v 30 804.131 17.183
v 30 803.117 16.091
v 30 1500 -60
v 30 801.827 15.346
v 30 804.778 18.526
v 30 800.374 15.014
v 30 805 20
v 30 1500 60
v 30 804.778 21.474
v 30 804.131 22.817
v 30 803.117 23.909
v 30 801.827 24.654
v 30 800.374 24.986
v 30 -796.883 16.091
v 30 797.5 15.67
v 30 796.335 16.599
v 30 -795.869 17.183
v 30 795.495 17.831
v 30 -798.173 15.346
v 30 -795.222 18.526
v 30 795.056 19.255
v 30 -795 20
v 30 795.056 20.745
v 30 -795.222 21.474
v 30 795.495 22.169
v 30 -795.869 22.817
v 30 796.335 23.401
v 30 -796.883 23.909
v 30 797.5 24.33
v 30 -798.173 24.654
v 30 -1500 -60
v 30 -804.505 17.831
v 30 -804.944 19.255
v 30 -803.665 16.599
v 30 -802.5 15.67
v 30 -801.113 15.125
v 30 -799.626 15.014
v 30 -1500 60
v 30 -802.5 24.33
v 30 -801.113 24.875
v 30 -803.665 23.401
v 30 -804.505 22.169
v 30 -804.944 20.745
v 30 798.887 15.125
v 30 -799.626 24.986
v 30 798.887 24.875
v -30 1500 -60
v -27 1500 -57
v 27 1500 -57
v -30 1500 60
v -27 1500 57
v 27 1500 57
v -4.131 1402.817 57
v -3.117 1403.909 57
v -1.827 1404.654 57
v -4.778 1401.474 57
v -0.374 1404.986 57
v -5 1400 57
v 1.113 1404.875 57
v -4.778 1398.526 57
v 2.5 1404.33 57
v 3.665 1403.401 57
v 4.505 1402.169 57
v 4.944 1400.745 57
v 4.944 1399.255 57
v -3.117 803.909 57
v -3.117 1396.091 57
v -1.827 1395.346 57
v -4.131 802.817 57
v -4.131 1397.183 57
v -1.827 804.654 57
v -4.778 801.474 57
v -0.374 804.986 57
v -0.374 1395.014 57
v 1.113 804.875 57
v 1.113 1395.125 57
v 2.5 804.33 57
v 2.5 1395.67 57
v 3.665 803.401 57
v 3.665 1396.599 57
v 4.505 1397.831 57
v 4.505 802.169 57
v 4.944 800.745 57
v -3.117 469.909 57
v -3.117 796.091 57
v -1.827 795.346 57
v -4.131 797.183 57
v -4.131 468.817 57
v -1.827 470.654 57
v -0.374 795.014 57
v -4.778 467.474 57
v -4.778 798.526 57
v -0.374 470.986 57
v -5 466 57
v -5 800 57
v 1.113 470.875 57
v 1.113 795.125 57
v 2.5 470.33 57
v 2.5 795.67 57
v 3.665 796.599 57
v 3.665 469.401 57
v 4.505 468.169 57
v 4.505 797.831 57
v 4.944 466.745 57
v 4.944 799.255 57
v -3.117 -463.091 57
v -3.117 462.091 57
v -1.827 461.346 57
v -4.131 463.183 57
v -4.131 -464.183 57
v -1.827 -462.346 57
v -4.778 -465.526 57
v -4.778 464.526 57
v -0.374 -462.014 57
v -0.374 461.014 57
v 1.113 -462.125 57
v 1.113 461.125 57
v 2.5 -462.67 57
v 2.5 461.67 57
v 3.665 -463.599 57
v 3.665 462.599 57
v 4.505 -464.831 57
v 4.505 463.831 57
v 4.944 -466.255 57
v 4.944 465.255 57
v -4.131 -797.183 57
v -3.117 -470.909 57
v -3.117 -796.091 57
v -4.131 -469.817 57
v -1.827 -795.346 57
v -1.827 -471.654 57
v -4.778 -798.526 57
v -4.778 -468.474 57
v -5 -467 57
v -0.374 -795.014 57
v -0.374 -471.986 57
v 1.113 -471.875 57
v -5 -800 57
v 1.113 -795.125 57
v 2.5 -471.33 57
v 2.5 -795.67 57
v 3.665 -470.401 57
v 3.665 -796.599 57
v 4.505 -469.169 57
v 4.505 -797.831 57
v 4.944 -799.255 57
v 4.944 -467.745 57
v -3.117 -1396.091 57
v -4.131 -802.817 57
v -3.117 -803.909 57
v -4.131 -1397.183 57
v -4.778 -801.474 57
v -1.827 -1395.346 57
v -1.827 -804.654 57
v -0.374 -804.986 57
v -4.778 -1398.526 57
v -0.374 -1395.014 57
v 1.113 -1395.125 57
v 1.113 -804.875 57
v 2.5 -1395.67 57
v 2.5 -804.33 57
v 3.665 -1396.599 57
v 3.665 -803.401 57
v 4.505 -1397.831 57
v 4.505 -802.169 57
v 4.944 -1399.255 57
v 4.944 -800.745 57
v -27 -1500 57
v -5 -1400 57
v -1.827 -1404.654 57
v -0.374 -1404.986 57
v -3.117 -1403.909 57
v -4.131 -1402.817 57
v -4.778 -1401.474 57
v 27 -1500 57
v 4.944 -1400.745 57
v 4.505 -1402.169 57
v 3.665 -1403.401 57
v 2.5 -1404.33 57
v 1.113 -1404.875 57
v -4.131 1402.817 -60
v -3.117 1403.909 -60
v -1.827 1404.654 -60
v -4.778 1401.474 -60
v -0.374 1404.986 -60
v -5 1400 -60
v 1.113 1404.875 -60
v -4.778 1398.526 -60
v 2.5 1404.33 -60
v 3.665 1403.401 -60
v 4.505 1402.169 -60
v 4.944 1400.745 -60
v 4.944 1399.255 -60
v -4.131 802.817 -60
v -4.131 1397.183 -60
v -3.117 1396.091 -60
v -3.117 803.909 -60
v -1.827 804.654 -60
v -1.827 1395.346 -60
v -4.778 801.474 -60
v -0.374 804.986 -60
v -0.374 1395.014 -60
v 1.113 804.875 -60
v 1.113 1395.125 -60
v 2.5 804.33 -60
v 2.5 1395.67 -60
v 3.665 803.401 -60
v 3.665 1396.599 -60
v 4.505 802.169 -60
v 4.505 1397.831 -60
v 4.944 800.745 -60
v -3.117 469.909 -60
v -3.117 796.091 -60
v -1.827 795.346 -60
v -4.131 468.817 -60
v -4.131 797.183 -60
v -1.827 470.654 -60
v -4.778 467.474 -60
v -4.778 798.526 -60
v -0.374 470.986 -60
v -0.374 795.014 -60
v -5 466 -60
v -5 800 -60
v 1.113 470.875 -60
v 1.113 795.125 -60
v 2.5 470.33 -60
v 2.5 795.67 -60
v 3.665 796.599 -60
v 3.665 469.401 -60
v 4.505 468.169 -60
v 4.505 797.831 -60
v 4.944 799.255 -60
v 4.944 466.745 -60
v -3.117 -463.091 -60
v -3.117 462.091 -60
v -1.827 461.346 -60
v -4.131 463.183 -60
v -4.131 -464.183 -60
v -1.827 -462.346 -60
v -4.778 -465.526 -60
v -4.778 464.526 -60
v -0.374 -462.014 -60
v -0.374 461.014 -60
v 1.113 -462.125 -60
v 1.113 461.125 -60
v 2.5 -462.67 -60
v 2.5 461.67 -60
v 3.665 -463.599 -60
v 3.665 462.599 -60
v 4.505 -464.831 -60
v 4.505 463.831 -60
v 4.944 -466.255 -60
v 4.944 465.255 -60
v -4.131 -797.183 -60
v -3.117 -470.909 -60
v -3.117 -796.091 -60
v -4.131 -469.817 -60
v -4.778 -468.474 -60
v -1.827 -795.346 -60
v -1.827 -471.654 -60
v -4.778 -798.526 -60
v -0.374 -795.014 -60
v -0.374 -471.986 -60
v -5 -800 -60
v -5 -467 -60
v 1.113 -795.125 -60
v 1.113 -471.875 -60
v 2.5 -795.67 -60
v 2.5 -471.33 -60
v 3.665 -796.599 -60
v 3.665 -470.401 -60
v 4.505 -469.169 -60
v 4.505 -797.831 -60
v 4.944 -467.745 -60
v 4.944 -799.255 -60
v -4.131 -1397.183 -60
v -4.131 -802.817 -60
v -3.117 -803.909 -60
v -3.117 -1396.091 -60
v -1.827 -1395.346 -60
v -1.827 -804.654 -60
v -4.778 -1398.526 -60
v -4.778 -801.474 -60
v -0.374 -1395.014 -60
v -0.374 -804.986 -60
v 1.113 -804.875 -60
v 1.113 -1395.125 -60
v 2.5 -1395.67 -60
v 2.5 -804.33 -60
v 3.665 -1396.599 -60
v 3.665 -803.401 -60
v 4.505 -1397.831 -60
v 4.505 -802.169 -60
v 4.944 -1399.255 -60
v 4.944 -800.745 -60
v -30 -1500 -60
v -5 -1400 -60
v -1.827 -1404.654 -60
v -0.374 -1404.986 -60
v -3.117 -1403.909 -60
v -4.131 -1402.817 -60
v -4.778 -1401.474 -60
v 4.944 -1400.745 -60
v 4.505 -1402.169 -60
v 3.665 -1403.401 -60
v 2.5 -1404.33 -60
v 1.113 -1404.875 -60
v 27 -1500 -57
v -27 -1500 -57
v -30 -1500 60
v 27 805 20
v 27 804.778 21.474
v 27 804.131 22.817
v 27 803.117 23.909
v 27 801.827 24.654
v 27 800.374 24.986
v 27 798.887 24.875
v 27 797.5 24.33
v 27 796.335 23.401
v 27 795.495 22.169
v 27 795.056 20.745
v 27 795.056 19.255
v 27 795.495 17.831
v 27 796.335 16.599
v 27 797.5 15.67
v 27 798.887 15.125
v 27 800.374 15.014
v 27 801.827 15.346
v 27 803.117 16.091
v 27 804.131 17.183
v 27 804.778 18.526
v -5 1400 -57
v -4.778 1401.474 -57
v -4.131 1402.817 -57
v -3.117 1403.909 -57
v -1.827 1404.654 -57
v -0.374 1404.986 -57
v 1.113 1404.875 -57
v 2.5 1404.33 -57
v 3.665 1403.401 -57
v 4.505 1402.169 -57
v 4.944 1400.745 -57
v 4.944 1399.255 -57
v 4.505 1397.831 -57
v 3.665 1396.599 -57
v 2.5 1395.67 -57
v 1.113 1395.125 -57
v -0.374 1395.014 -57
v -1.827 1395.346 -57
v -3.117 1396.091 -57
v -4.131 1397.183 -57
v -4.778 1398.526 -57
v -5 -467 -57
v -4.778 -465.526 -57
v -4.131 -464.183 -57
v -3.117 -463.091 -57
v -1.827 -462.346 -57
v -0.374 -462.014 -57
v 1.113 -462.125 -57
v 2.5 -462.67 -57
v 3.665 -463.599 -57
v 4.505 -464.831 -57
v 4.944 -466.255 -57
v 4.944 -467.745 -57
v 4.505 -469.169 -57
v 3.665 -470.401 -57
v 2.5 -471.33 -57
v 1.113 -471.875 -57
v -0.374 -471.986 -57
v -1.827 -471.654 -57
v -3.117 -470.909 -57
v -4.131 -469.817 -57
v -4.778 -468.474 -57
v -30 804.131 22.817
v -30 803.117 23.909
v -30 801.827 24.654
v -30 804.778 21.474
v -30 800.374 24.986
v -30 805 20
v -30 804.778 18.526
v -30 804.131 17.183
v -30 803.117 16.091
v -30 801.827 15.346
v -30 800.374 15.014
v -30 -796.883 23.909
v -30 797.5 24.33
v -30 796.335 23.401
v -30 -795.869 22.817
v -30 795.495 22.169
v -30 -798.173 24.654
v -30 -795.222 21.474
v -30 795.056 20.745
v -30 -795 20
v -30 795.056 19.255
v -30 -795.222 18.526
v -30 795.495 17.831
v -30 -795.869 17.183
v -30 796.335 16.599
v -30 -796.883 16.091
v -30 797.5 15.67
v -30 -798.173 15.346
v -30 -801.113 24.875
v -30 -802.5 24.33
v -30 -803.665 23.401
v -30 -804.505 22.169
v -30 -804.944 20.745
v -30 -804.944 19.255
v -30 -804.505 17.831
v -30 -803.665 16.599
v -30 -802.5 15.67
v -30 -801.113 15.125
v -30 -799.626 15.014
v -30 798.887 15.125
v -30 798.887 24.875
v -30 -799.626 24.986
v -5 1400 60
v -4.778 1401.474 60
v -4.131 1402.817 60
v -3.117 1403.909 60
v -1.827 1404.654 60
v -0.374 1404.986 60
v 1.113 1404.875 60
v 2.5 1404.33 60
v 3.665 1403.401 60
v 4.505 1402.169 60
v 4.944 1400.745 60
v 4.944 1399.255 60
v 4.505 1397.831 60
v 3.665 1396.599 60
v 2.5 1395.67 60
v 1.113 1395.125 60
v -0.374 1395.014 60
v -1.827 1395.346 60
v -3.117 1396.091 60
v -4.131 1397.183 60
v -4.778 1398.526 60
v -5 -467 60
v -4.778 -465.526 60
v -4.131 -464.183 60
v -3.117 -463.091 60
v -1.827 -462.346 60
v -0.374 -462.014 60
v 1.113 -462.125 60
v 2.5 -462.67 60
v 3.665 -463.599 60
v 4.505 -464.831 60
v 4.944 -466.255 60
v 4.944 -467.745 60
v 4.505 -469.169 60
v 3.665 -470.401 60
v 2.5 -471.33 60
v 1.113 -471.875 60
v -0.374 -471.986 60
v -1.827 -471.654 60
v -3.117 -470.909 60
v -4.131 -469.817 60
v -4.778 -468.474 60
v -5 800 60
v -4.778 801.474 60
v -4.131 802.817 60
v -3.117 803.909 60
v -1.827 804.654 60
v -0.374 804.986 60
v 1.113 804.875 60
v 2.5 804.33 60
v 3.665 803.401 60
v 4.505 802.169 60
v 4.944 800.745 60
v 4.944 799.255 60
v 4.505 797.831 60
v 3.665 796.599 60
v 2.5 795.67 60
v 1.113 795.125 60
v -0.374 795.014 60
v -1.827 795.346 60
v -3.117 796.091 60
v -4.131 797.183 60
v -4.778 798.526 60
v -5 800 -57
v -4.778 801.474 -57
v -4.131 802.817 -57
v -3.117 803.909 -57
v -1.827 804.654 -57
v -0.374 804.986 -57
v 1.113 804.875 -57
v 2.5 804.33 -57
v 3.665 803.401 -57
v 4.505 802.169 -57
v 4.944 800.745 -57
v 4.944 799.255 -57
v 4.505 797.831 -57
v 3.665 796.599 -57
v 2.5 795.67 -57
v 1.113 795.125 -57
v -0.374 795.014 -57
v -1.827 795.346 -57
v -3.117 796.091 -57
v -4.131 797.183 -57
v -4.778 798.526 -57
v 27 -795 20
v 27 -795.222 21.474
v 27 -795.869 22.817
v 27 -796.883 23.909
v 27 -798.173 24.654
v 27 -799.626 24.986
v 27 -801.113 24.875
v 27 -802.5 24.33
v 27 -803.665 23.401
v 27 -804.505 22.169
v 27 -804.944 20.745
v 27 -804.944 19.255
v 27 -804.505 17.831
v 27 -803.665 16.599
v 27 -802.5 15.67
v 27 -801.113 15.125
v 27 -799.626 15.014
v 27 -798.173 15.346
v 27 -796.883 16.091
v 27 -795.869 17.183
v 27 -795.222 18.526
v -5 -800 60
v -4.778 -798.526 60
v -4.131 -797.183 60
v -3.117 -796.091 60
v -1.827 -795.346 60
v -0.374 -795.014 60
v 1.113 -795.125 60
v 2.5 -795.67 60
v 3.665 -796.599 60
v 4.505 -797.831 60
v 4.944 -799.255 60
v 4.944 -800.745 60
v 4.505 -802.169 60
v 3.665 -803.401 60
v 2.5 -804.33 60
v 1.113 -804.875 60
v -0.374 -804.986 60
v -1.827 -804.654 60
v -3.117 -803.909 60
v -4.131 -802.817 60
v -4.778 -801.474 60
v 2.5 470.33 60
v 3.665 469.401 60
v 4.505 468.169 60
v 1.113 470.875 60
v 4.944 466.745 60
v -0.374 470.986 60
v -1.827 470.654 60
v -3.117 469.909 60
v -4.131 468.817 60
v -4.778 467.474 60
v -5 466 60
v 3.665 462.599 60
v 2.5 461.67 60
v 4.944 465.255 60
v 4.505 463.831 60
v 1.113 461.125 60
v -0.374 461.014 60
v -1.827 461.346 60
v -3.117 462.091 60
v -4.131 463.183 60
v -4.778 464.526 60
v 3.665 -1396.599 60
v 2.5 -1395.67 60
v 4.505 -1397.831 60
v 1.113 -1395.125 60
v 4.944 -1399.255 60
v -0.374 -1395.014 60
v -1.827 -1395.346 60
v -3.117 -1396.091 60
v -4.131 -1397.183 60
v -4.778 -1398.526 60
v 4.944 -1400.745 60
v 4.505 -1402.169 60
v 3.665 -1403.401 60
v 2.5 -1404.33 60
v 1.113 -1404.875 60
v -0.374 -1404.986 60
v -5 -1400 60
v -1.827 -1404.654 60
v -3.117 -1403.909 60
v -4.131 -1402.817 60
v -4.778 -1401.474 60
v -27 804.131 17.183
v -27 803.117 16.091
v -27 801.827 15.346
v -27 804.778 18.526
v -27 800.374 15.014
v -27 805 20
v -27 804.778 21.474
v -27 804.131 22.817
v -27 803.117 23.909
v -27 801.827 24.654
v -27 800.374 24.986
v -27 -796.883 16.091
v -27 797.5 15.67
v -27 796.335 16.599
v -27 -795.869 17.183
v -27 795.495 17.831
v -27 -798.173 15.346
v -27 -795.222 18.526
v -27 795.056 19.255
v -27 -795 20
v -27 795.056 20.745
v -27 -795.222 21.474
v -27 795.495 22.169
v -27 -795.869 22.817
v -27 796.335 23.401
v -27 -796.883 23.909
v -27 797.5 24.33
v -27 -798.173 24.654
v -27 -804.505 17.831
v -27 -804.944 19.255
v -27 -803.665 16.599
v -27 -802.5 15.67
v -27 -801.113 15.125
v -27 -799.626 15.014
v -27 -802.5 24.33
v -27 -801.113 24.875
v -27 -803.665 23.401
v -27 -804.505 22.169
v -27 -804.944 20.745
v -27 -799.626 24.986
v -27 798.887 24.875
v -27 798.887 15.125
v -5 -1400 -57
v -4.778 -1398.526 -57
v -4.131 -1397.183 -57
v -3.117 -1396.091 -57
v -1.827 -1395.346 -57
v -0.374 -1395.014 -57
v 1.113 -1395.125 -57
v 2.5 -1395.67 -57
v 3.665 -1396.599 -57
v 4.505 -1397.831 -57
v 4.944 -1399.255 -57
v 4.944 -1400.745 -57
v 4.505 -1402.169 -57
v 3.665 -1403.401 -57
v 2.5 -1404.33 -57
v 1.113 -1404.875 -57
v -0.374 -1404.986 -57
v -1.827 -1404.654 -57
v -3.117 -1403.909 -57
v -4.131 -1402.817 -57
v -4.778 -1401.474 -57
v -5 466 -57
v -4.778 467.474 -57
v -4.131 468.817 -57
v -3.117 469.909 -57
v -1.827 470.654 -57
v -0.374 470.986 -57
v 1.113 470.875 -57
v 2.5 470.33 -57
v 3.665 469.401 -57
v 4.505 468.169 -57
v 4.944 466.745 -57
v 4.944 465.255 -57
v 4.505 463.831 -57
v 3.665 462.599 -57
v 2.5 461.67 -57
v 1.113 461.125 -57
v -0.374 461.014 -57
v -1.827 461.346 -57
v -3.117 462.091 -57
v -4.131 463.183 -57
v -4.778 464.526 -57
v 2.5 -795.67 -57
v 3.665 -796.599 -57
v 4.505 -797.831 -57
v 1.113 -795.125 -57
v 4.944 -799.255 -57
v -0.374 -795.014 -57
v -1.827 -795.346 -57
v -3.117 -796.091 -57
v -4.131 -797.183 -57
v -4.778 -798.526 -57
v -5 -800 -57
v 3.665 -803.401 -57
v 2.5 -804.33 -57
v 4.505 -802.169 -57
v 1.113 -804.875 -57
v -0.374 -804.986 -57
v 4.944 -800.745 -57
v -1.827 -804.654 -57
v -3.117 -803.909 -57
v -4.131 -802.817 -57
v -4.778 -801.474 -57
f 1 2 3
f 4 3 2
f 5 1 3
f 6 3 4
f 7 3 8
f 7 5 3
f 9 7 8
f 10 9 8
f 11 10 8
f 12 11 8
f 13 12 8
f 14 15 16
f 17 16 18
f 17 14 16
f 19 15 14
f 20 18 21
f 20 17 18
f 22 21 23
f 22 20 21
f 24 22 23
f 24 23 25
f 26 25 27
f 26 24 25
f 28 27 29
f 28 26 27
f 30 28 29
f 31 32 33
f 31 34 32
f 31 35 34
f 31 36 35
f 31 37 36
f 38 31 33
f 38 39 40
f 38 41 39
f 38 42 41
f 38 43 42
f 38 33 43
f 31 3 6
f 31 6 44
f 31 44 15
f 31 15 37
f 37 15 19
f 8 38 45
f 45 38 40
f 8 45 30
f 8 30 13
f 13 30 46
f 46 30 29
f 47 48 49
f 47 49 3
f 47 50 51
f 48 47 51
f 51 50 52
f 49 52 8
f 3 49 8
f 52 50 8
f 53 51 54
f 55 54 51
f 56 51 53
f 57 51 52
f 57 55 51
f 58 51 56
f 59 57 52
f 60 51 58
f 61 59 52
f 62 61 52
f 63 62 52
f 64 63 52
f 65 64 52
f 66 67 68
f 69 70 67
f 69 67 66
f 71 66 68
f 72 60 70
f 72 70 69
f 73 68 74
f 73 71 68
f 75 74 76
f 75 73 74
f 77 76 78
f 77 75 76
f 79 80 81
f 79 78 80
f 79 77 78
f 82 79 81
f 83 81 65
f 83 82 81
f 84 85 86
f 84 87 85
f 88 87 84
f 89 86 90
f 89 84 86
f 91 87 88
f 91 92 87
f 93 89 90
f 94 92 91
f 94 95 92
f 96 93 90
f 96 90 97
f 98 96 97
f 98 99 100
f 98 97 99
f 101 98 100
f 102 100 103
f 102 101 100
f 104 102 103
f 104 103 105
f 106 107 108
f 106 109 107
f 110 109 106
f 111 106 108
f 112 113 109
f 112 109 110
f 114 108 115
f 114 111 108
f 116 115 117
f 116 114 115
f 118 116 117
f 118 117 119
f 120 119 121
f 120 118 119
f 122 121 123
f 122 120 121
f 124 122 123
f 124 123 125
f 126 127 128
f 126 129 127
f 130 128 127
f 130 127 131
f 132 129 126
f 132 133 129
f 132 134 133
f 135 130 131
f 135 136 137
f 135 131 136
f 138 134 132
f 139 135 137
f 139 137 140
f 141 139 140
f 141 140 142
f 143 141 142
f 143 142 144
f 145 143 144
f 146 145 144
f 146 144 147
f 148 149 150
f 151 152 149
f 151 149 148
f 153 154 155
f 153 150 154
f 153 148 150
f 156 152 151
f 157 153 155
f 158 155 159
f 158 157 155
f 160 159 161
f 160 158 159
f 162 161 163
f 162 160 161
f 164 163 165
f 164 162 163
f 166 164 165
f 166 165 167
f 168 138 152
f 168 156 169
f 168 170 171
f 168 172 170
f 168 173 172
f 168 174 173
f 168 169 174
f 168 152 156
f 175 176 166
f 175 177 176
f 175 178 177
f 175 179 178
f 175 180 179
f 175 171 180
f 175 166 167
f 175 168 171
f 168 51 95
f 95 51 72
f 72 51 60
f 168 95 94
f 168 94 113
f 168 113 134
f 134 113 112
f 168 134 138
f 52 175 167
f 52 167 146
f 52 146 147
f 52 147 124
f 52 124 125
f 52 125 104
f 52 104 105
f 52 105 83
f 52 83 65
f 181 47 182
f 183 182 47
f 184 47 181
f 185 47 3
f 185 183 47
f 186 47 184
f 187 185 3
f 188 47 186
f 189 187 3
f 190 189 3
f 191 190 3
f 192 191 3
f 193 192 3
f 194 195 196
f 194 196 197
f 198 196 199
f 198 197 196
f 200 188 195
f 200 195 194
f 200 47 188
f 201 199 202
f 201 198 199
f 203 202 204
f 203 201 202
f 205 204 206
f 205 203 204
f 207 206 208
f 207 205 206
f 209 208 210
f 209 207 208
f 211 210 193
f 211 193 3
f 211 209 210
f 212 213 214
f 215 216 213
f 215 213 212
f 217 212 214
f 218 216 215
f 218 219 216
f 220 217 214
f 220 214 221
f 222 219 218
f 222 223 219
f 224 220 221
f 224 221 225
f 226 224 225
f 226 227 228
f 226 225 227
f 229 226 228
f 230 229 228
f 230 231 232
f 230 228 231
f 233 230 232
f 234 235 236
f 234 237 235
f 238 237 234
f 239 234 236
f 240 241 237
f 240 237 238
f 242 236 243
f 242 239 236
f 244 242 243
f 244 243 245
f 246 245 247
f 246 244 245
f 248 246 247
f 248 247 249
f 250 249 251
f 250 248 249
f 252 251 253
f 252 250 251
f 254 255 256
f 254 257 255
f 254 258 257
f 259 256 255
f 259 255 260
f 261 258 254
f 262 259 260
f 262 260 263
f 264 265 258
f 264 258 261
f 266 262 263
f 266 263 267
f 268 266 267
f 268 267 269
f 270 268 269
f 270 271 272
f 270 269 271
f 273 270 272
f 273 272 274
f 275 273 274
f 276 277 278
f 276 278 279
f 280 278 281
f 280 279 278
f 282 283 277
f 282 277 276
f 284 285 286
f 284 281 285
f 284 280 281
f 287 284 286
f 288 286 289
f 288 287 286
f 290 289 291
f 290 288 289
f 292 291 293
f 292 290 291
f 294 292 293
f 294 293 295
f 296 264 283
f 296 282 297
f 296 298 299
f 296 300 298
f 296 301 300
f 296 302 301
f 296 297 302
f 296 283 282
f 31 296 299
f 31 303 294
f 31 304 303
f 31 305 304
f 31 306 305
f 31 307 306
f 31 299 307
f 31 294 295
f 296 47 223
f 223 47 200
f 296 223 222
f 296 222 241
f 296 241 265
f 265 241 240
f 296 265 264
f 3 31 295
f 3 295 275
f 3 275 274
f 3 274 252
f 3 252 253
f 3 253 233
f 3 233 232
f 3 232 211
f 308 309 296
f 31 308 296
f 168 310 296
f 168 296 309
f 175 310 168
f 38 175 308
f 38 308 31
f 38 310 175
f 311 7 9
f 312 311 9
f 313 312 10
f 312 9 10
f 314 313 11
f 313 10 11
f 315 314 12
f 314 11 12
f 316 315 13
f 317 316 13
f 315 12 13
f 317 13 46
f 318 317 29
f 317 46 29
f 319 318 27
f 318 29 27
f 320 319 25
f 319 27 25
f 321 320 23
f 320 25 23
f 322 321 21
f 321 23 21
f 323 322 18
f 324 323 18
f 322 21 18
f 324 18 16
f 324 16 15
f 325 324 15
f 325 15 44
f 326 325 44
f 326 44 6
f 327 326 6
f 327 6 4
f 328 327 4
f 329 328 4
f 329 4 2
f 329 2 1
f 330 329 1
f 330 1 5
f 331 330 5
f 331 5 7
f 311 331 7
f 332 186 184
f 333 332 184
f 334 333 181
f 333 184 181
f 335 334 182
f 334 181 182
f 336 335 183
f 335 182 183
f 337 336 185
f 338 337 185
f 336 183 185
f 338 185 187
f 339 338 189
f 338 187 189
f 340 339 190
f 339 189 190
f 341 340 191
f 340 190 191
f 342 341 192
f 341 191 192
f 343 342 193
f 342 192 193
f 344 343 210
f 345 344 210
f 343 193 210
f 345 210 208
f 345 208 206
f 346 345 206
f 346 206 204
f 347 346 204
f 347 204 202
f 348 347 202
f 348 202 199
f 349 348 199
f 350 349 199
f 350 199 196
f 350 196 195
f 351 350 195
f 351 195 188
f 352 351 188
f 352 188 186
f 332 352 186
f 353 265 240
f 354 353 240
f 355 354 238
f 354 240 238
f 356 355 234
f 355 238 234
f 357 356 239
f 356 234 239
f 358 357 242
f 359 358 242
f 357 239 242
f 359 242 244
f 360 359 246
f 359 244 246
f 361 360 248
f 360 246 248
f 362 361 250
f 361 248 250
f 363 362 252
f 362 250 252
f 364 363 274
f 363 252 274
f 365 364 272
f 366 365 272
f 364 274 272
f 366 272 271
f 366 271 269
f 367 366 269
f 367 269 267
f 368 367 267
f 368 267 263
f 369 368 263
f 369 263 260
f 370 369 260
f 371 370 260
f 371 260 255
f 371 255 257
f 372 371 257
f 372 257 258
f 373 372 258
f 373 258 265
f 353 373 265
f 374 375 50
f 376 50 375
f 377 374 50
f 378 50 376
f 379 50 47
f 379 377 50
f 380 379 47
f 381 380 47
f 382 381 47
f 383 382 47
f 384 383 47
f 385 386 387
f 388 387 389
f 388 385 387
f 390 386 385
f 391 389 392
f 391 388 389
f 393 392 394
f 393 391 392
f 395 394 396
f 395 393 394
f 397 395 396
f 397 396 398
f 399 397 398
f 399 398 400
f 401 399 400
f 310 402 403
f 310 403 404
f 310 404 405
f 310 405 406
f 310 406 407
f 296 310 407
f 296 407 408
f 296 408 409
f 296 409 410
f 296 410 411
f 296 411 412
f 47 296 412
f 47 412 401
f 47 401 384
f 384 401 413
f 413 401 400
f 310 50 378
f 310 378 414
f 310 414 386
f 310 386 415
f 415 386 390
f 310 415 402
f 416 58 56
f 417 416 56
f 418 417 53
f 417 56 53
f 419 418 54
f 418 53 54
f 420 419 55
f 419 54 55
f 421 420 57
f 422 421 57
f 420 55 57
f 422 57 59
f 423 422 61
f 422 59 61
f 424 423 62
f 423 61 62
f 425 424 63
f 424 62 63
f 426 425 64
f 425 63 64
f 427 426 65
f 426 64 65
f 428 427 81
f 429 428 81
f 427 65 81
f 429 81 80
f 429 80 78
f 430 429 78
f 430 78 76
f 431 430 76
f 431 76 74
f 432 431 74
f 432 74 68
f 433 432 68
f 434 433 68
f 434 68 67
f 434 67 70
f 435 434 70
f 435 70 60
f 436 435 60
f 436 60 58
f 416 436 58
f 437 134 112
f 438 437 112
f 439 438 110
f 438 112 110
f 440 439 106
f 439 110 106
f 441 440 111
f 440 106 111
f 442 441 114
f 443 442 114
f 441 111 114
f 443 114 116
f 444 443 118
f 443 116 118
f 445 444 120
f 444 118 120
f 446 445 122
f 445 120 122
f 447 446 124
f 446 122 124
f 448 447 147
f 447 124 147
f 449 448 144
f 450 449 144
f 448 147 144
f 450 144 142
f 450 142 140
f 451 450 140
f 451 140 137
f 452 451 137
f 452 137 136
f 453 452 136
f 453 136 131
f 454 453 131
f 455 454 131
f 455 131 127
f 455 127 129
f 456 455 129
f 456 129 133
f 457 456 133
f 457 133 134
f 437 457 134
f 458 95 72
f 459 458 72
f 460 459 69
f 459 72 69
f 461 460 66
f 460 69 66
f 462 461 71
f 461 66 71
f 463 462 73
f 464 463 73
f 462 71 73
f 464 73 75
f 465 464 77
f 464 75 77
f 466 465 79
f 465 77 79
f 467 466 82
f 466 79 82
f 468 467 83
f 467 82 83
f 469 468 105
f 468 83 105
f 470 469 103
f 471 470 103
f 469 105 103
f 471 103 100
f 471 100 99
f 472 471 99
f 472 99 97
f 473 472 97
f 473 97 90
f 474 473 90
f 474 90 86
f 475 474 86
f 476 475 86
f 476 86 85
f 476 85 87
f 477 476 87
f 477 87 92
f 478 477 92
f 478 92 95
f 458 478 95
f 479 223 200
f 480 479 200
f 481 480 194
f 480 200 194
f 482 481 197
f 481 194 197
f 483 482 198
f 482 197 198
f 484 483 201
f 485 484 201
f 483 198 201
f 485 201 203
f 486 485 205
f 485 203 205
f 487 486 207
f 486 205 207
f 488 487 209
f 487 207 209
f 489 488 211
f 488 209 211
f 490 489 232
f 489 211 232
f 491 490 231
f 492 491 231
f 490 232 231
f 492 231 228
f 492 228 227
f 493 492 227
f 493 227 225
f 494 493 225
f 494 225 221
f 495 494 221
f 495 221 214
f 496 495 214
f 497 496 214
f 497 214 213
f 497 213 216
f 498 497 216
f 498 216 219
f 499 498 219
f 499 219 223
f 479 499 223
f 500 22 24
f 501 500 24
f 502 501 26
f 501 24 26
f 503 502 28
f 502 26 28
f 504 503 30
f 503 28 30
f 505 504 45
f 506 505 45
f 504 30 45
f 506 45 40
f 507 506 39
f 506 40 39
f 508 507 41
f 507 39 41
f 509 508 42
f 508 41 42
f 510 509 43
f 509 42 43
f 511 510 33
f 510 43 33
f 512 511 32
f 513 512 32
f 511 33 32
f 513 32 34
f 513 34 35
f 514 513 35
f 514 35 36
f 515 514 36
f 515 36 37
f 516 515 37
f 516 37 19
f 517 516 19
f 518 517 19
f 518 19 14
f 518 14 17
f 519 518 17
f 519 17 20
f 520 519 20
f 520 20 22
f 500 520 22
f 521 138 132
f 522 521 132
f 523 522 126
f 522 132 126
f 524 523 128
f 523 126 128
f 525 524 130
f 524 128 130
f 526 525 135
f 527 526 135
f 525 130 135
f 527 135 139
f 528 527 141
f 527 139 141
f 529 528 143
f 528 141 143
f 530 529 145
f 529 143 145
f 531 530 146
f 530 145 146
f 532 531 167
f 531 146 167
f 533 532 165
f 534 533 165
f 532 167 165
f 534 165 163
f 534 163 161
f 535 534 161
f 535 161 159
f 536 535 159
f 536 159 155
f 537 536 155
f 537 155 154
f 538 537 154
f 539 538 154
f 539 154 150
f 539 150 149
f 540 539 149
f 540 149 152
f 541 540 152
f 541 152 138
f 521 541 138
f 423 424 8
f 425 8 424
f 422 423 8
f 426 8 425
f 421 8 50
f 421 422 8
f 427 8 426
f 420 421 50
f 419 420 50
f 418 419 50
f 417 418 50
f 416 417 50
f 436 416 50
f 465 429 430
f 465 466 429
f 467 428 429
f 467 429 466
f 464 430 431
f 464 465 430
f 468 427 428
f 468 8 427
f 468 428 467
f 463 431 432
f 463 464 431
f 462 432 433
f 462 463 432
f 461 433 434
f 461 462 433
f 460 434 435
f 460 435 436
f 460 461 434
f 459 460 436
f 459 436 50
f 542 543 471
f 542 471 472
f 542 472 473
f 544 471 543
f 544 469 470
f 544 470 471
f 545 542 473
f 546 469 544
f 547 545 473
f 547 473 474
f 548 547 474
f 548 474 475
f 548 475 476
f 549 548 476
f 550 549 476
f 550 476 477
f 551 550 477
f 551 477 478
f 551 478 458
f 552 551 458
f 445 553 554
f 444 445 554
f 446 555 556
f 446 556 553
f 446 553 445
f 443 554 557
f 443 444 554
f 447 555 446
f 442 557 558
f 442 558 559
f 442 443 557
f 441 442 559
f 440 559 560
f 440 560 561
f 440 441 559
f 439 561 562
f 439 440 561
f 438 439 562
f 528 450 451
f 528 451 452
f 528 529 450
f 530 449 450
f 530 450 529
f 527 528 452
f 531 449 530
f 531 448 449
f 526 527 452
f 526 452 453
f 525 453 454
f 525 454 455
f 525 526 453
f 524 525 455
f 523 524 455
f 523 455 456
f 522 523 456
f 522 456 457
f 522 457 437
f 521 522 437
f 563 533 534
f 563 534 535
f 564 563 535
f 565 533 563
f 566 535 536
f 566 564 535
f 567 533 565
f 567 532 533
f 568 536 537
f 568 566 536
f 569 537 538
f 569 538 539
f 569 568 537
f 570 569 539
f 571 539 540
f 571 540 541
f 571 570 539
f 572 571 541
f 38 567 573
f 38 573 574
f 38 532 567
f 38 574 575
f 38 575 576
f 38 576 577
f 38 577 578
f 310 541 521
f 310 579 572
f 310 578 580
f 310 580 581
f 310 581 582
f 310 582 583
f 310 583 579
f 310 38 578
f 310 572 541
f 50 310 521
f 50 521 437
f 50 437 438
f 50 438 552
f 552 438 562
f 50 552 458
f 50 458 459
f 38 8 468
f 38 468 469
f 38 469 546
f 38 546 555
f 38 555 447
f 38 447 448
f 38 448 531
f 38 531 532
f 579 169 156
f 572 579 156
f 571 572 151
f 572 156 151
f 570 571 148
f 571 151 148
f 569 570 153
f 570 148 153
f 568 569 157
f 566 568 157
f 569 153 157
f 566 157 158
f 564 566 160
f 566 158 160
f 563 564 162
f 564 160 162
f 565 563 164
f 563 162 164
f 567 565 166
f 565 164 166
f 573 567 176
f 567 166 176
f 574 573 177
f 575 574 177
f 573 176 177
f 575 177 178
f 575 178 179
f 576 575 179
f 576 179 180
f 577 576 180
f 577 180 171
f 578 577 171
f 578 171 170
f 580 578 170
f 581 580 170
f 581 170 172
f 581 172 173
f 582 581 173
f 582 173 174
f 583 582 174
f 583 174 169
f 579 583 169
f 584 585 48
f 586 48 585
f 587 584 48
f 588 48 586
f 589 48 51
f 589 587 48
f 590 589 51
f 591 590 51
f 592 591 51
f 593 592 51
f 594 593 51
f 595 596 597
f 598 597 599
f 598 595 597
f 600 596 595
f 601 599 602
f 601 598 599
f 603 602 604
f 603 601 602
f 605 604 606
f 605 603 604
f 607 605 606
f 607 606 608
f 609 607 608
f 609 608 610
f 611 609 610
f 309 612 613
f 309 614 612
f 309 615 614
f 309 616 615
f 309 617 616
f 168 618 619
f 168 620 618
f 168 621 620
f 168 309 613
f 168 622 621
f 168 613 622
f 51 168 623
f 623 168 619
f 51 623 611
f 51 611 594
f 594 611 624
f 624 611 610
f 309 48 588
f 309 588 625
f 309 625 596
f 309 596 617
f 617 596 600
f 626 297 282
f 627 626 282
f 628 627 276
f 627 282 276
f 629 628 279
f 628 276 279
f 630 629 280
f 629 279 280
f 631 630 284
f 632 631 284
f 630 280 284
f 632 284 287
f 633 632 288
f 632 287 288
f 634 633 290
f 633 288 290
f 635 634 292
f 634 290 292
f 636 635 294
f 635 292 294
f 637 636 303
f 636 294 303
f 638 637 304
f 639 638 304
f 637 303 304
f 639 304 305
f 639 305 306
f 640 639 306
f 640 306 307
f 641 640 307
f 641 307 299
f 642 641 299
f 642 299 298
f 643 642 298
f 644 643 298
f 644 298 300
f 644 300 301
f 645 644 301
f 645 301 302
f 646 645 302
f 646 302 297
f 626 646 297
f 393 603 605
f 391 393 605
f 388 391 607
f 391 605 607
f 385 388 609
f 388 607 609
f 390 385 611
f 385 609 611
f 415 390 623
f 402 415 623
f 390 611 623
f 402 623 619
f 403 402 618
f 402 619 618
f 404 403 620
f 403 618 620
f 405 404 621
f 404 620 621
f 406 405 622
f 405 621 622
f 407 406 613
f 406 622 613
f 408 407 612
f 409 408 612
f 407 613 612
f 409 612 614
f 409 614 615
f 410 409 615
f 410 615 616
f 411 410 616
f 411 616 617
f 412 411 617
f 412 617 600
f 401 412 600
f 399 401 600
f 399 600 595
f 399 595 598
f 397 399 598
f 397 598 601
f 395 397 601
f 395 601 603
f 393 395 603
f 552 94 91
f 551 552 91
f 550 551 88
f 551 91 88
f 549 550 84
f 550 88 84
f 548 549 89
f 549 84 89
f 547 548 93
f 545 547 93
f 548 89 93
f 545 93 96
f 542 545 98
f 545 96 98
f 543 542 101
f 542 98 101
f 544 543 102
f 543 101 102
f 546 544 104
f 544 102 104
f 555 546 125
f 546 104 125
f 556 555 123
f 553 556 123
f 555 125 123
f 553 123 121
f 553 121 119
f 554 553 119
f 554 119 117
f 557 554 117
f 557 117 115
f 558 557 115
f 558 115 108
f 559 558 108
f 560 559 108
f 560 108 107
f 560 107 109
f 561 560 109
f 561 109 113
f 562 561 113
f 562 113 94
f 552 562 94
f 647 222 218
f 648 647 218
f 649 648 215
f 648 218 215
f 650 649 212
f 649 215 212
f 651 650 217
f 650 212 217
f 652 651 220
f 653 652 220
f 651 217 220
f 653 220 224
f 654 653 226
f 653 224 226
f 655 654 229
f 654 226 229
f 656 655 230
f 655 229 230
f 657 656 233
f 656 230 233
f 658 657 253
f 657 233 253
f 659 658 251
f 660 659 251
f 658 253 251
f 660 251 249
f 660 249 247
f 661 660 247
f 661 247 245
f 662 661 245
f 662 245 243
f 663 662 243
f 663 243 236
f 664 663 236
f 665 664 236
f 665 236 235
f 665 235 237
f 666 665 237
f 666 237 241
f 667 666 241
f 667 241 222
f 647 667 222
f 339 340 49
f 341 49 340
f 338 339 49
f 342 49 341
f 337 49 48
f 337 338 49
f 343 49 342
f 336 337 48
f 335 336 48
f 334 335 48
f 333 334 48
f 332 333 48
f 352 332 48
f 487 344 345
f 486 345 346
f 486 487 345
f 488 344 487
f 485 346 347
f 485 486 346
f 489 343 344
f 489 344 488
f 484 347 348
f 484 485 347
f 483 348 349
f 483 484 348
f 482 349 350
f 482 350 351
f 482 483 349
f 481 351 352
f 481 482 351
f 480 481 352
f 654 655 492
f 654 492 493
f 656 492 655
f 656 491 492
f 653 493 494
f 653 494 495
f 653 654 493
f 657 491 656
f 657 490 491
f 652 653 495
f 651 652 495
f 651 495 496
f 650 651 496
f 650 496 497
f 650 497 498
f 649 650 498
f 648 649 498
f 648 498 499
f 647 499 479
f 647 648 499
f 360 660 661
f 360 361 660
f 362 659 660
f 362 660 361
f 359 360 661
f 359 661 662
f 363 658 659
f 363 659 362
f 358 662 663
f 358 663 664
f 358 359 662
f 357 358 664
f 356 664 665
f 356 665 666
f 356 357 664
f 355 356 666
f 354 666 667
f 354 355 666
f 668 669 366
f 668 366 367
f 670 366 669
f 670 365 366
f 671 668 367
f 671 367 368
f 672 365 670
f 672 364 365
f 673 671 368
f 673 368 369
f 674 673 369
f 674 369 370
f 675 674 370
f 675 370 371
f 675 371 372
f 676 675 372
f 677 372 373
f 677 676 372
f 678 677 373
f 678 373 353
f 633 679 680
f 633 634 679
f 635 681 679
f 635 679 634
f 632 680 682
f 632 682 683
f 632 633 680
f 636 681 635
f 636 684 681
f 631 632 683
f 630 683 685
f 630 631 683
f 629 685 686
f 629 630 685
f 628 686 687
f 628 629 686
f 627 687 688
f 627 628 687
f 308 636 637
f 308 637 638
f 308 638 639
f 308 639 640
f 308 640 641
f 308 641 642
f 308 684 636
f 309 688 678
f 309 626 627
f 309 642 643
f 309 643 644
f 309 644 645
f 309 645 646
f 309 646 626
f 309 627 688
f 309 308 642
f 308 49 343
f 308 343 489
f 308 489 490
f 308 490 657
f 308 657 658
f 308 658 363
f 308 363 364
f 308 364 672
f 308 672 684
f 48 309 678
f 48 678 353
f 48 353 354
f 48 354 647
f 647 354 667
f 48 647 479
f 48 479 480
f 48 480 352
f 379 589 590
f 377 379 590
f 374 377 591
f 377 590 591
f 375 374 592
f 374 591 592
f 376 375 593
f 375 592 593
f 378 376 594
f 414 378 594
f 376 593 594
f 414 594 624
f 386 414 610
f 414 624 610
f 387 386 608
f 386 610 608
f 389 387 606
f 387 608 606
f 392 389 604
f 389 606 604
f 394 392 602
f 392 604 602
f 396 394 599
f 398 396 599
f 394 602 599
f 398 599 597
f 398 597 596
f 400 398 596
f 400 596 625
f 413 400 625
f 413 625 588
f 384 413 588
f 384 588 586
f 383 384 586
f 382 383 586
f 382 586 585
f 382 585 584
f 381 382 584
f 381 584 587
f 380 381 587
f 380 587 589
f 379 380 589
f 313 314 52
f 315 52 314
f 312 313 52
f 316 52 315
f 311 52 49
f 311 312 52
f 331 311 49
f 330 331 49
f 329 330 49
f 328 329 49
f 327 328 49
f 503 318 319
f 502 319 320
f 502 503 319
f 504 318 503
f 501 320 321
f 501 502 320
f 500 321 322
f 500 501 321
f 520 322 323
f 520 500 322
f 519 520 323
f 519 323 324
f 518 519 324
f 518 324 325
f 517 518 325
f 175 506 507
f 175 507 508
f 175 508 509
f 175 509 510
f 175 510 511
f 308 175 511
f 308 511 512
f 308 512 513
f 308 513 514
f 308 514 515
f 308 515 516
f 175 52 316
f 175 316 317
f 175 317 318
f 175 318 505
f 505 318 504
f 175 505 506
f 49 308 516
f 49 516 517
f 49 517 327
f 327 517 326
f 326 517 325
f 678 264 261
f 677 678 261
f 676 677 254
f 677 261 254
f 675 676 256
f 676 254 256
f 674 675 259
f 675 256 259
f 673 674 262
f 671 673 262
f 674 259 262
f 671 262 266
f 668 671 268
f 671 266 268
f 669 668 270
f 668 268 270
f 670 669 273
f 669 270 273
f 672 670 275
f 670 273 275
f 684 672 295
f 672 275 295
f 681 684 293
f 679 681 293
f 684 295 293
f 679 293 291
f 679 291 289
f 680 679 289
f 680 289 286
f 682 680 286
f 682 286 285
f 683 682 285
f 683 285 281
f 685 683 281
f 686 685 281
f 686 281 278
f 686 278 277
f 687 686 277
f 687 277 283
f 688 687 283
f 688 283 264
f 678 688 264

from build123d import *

# Parameters (mm, degrees)
F1_DEPTH = 1500
F3_D     = 10
F5_D     = 10


with BuildPart() as f1:
    # F0 (on Front) → F1 (new body, symmetric)
    with BuildSketch(Plane.XZ):
        Polygon((-30, 60), (-30, 0), (-30, -60), (30, -60), (30, 60), align=None)
        Polygon((-27, 0), (-27, 57), (27, 57), (27, -57), (-27, -57), align=None, mode=Mode.SUBTRACT)
    extrude(amount=F1_DEPTH, both=True)

    # F3 (through all)
    with Locations(Plane.XY.offset(60)):
        with Locations((0, 800), (0, -800), (0, 1400), (0, 466), (0, -467), (0, -1400)):
            Hole(F3_D / 2)

    # F5 (through all)
    with Locations(Plane(origin=(-30, 0, 0), x_dir=(0, -1, 0), z_dir=(-1, 0, 0))):
        with Locations((-800, 20), (800, 20)):
            Hole(F5_D / 2)


solid = f1.part
